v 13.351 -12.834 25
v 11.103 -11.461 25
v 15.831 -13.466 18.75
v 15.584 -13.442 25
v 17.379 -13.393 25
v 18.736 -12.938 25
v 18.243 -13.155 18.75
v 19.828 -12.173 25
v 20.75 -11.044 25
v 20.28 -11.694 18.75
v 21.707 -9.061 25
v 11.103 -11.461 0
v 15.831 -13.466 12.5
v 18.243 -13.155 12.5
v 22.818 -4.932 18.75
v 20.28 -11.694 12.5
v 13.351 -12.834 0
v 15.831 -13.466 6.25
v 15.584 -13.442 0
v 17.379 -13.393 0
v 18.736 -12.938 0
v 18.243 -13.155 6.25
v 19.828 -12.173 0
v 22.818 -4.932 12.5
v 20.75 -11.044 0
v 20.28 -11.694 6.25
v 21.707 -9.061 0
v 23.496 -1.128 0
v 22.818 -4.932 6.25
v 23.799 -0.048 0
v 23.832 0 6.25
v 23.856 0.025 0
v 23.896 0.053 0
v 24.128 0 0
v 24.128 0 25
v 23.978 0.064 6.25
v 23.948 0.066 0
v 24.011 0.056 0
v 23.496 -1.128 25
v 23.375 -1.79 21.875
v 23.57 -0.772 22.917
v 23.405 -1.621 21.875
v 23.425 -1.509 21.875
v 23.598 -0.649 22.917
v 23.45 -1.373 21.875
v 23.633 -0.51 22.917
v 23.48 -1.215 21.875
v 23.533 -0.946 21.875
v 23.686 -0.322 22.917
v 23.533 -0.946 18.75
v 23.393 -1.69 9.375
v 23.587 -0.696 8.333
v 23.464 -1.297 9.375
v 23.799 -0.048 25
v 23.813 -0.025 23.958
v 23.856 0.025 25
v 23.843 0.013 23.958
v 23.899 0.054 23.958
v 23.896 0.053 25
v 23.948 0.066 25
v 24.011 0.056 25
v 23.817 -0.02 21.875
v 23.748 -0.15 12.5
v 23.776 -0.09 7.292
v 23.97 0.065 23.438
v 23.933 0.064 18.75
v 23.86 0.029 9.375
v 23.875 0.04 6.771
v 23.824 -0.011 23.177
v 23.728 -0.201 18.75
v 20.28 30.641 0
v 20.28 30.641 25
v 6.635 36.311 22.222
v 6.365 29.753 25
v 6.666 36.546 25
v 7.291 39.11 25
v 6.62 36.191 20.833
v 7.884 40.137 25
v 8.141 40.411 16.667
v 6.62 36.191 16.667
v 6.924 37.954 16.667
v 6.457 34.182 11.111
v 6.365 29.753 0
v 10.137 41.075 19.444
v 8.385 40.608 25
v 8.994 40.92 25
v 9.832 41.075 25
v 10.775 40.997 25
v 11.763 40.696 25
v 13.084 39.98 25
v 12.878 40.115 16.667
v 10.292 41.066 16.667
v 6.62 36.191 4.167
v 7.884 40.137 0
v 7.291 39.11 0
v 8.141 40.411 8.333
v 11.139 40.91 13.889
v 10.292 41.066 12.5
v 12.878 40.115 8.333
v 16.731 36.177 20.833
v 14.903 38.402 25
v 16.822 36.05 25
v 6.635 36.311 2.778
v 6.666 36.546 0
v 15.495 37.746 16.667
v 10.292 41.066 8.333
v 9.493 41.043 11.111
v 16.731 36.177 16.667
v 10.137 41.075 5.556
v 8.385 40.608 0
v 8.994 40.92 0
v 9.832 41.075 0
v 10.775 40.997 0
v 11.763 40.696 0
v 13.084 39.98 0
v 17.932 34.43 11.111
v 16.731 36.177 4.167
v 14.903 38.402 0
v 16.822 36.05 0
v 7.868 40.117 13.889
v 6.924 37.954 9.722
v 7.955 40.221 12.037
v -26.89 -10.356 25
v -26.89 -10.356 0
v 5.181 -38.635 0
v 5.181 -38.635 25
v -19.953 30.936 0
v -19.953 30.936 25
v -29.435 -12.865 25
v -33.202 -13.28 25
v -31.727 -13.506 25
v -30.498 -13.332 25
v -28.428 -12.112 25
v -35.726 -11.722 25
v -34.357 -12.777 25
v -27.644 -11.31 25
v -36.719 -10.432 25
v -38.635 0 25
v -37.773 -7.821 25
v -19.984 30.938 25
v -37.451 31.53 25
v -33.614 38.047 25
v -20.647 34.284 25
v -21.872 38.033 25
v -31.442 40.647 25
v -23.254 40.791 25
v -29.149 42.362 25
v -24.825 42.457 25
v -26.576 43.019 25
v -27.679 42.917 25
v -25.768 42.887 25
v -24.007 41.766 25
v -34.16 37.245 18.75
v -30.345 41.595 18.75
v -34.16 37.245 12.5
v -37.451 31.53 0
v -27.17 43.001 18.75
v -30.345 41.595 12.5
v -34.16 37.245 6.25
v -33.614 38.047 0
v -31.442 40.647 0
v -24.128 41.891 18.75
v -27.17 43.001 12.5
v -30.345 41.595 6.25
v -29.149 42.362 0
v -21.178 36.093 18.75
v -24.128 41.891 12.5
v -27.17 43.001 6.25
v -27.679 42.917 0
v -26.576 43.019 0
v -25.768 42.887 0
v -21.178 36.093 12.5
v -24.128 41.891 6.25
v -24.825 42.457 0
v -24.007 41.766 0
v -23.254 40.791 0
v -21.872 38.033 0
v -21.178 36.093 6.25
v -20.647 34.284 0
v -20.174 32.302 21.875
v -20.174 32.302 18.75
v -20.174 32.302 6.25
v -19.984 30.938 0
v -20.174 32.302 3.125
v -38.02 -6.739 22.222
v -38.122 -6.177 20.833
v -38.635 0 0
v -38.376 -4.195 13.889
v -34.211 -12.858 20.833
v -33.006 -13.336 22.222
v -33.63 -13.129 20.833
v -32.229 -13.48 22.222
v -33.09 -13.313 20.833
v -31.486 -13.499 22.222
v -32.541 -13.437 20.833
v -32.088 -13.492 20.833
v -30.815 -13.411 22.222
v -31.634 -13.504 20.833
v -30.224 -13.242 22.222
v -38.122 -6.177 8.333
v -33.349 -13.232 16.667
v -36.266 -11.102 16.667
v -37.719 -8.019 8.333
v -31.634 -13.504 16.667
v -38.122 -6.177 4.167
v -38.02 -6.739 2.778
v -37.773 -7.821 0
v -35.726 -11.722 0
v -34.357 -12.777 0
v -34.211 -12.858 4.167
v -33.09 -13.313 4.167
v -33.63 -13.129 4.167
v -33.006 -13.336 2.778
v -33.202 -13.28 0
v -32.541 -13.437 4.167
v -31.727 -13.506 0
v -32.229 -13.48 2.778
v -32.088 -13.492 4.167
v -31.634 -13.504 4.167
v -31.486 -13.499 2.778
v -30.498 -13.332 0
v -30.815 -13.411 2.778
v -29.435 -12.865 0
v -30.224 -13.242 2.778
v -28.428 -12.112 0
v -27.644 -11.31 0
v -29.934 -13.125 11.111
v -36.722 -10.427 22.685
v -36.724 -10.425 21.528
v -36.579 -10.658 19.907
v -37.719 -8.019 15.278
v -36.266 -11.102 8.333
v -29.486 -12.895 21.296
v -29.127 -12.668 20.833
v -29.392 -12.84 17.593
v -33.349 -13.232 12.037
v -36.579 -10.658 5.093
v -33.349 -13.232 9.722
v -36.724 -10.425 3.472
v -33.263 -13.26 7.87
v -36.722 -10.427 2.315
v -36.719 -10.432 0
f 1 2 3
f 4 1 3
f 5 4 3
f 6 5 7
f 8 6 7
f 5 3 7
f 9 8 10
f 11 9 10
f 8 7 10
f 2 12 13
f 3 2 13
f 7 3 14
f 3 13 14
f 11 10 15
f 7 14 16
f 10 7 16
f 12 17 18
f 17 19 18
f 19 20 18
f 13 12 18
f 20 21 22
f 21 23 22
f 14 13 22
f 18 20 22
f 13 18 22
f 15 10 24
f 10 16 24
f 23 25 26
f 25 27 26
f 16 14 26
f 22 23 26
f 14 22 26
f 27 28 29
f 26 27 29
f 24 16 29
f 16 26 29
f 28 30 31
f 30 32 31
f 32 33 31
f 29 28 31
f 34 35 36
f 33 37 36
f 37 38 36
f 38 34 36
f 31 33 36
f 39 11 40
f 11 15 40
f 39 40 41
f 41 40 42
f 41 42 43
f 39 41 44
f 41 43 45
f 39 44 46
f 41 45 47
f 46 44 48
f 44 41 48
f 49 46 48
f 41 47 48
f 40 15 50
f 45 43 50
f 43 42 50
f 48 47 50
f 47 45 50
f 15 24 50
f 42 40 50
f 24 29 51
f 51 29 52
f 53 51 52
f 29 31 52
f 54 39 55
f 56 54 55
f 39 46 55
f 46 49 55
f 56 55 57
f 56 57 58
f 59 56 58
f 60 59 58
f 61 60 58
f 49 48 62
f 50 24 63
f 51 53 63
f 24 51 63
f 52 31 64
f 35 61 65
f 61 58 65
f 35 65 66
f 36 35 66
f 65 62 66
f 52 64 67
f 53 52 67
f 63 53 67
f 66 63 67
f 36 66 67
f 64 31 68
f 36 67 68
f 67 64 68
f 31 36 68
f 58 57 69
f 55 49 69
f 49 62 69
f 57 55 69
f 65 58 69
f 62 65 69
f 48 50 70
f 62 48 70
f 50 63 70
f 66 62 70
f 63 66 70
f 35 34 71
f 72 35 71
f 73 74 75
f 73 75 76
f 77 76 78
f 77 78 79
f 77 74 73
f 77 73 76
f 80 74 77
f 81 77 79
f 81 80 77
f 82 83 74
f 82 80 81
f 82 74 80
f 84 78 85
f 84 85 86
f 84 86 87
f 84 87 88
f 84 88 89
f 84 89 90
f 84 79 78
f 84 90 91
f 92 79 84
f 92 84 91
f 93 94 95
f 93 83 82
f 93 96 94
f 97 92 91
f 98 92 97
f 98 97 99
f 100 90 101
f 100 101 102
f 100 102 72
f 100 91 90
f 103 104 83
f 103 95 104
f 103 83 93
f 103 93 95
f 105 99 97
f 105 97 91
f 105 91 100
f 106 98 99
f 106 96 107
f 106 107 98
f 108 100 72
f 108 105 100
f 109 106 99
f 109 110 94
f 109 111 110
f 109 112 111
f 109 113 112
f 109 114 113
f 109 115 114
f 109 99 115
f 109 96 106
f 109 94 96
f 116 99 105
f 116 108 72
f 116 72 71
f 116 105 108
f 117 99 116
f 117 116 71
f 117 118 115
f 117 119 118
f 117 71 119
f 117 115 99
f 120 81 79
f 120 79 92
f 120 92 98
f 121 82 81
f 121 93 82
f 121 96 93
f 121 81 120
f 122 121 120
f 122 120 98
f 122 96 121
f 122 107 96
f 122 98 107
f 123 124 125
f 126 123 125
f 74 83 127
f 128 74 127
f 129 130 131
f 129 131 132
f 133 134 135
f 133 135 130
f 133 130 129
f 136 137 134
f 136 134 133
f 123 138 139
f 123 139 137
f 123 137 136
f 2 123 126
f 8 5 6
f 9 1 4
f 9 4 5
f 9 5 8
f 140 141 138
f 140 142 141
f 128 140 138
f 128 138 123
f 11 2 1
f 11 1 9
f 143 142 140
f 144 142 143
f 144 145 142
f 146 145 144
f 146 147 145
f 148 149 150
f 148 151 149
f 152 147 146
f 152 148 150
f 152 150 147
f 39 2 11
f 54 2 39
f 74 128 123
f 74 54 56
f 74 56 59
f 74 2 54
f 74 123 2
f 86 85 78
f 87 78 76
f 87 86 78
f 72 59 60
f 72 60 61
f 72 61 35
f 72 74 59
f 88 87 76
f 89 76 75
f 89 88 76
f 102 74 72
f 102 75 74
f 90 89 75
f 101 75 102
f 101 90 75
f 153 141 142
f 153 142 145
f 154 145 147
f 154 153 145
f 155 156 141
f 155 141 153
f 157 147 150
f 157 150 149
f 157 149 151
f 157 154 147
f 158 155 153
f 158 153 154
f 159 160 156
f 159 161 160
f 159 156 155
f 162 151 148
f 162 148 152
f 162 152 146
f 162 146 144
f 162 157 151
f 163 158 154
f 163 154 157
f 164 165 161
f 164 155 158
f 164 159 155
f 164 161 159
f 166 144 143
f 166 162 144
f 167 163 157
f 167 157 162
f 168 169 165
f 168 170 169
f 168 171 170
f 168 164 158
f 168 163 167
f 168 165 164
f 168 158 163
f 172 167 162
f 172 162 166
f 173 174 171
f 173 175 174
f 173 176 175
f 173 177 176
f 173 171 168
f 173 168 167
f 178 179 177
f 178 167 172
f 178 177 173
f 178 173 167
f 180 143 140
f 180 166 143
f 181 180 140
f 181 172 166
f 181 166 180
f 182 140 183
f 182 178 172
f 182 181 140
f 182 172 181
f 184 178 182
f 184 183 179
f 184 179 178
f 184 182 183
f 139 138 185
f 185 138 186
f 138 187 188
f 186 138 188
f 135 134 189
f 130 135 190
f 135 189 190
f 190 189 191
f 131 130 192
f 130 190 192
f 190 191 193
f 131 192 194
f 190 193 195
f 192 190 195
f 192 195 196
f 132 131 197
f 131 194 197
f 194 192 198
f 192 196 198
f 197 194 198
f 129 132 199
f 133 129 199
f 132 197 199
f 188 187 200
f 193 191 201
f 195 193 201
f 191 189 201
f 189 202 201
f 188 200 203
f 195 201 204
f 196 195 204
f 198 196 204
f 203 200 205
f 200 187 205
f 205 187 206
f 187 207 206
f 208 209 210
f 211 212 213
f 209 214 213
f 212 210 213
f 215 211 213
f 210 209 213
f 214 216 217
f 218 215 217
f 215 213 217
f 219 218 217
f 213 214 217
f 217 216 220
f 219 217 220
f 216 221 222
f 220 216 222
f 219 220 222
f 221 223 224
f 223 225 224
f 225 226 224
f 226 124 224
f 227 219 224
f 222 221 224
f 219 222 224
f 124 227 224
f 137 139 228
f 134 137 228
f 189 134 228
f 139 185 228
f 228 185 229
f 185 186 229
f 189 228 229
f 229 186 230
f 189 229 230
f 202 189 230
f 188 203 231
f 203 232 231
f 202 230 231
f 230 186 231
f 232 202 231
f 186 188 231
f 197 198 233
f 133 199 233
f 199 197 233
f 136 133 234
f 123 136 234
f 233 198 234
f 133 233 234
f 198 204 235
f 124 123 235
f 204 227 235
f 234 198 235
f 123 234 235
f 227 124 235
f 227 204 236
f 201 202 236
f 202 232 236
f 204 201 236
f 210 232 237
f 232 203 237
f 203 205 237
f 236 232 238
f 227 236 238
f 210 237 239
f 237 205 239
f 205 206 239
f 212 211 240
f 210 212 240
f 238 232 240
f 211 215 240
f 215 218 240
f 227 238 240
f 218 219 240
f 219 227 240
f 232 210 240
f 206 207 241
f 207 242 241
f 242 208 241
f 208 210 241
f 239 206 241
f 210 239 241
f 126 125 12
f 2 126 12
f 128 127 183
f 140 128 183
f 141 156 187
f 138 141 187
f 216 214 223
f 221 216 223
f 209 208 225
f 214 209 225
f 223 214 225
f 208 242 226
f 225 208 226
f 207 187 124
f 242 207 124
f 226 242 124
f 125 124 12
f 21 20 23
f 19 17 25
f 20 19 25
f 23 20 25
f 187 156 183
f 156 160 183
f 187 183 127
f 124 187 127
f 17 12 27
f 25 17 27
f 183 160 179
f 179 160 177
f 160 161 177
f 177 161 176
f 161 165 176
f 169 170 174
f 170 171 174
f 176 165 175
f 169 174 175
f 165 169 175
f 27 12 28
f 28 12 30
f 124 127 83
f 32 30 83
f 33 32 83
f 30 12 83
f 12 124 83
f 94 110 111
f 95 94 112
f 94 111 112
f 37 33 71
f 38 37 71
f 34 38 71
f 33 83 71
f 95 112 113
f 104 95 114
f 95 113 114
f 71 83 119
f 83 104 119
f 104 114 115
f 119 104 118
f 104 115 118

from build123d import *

# Parameters (mm, degrees)
F1_DEPTH = 25


with BuildPart() as f1:
    # F0 (on Top) → F1 (new body)
    with BuildSketch(Plane.XY):
        with BuildLine():
            Line((-18.293430627, 0), (-37.4506600201, 31.5296053886))
            Line((-37.4506600201, 31.5296053886), (-38.6348702013, 0))
            Line((-38.6348702013, 0), (-26.8903197752, -10.3558365563))
            add(Edge.make_bspline(
                [(-26.8903197752, -10.3558365563), (-25.0138511487, -7.7621292657), (-23.3868603398, -3.8810646329), (-21.7598695308, 0)],
                knots=[0.7369926577, 0.7369926577, 0.7369926577, 0.7369926577, 1, 1, 1, 1], degree=3))
            Line((-21.7598695308, 0), (-18.293430627, 0))
        make_face()
        with BuildLine():
            add(Edge.make_bspline(
                [(-37.4506600201, 31.5296053886), (-35.315109491, 35.4914243796), (-31.6617104803, 42.2691172437), (-22.7549071417, 44.5389864619), (-19.8868391117, 31.3424591503), (-19.9717812594, 30.9867953724), (-19.9835542589, 30.937500298)],
                knots=[0, 0, 0, 0, 0.3534616592, 0.6046855171, 0.9452093296, 1, 1, 1, 1], degree=3))
            Line((-37.4506600201, 31.5296053886), (-18.293430627, 0))
            Line((-18.293430627, 0), (-8.7769662755, 0))
            Line((-8.7769662755, 0), (-19.9534838268, 30.9361488185))
            Line((-19.9534838268, 30.9361488185), (-19.9835542589, 30.937500298))
        make_face()
        with BuildLine():
            Line((-26.8903197752, -10.3558365563), (-38.6348702013, 0))
            add(Edge.make_bspline(
                [(-38.6348702013, 0), (-38.4419358813, -4.256929632), (-38.1024093928, -11.748289226), (-30.8831549051, -14.5997468242), (-27.8644585489, -11.7023183486), (-26.8903197752, -10.3558365563)],
                knots=[0, 0, 0, 0, 0.3412066145, 0.6004565887, 0.7369926577, 0.7369926577, 0.7369926577, 0.7369926577], degree=3))
        make_face()
        Polygon((5.1809218712, -38.6348702013), (-18.293430627, 0), (-21.7598695308, 0), align=None)
        Polygon((-8.7769662755, 0), (-18.293430627, 0), (5.1809218712, -38.6348702013), align=None)
        with BuildLine():
            Line((6.3651325181, 29.7532901168), (-19.9534838268, 30.9361488185))
            Line((-19.9534838268, 30.9361488185), (-8.7769662755, 0))
            Line((-8.7769662755, 0), (5.1809218712, 0))
            add(Edge.make_bspline(
                [(5.1809218712, 0), (5.3907033267, -0.660354955), (5.6004847821, -1.32070991), (5.8157272261, -1.9748633921)],
                knots=[0, 0, 0, 0, 0.0490741852, 0.0490741852, 0.0490741852, 0.0490741852], degree=3))
            Line((5.8157272261, -1.9748633921), (6.3651325181, 29.7532901168))
        make_face()
        with BuildLine():
            add(Edge.make_bspline(
                [(-26.8903197752, -10.3558365563), (-25.0138511487, -7.7621292657), (-23.3868603398, -3.8810646329), (-21.7598695308, 0)],
                knots=[0.7369926577, 0.7369926577, 0.7369926577, 0.7369926577, 1, 1, 1, 1], degree=3))
            Line((-26.8903197752, -10.3558365563), (5.1809218712, -38.6348702013))
            Line((5.1809218712, -38.6348702013), (-21.7598695308, 0))
        make_face()
        Polygon((5.1809218712, 0), (-8.7769662755, 0), (5.1809218712, -38.6348702013), align=None)
        with BuildLine():
            Line((5.1809218712, 0), (5.1809218712, -38.6348702013))
            Line((5.1809218712, -38.6348702013), (5.8157272261, -1.9748633921))
            add(Edge.make_bspline(
                [(5.1809218712, 0), (5.3907033267, -0.660354955), (5.6004847821, -1.32070991), (5.8157272261, -1.9748633921)],
                knots=[0, 0, 0, 0, 0.0490741852, 0.0490741852, 0.0490741852, 0.0490741852], degree=3))
        make_face()
        with BuildLine():
            Line((5.8157272261, -1.9748633921), (5.1809218712, -38.6348702013))
            Line((5.1809218712, -38.6348702013), (11.1034761376, -11.4607974057))
            add(Edge.make_bspline(
                [(5.8157272261, -1.9748633921), (7.0525840803, -5.7338535017), (8.4697652594, -9.288068156), (11.1034761376, -11.4607974057)],
                knots=[0.0490741852, 0.0490741852, 0.0490741852, 0.0490741852, 0.3310712728, 0.3310712728, 0.3310712728, 0.3310712728], degree=3))
        make_face()
        with BuildLine():
            add(Edge.make_bspline(
                [(6.3651325181, 29.7532901168), (6.3947430451, 34.2918495311), (6.4439782834, 41.8383904762), (14.1496668788, 40.8069928969), (17.9473376206, 34.5091520104), (20.2796068043, 30.6414496154)],
                knots=[0, 0, 0, 0, 0.3679740058, 0.6118529357, 1, 1, 1, 1], degree=3))
            Line((6.3651325181, 29.7532901168), (5.8157272261, -1.9748633921))
            add(Edge.make_bspline(
                [(5.8157272261, -1.9748633921), (7.0525840803, -5.7338535017), (8.4697652594, -9.288068156), (11.1034761376, -11.4607974057)],
                knots=[0.0490741852, 0.0490741852, 0.0490741852, 0.0490741852, 0.3310712728, 0.3310712728, 0.3310712728, 0.3310712728], degree=3))
            Line((11.1034761376, -11.4607974057), (20.2796068043, 30.6414496154))
        make_face()
        with BuildLine():
            Line((20.2796068043, 30.6414496154), (11.1034761376, -11.4607974057))
            add(Edge.make_bspline(
                [(11.1034761376, -11.4607974057), (11.2000080599, -11.5404332278), (13.9535287523, -13.7221274774), (22.647914545, -15.1627090559), (23.2770923169, 0.4801138246), (24.0272593597, 0.0569857777), (24.1282898933, 0)],
                knots=[0.3310712728, 0.3310712728, 0.3310712728, 0.3310712728, 0.3414071533, 0.6209883528, 0.9489557035, 1, 1, 1, 1], degree=3))
            Line((24.1282898933, 0), (20.2796068043, 30.6414496154))
        make_face()
    extrude(amount=F1_DEPTH)


solid = f1.part
